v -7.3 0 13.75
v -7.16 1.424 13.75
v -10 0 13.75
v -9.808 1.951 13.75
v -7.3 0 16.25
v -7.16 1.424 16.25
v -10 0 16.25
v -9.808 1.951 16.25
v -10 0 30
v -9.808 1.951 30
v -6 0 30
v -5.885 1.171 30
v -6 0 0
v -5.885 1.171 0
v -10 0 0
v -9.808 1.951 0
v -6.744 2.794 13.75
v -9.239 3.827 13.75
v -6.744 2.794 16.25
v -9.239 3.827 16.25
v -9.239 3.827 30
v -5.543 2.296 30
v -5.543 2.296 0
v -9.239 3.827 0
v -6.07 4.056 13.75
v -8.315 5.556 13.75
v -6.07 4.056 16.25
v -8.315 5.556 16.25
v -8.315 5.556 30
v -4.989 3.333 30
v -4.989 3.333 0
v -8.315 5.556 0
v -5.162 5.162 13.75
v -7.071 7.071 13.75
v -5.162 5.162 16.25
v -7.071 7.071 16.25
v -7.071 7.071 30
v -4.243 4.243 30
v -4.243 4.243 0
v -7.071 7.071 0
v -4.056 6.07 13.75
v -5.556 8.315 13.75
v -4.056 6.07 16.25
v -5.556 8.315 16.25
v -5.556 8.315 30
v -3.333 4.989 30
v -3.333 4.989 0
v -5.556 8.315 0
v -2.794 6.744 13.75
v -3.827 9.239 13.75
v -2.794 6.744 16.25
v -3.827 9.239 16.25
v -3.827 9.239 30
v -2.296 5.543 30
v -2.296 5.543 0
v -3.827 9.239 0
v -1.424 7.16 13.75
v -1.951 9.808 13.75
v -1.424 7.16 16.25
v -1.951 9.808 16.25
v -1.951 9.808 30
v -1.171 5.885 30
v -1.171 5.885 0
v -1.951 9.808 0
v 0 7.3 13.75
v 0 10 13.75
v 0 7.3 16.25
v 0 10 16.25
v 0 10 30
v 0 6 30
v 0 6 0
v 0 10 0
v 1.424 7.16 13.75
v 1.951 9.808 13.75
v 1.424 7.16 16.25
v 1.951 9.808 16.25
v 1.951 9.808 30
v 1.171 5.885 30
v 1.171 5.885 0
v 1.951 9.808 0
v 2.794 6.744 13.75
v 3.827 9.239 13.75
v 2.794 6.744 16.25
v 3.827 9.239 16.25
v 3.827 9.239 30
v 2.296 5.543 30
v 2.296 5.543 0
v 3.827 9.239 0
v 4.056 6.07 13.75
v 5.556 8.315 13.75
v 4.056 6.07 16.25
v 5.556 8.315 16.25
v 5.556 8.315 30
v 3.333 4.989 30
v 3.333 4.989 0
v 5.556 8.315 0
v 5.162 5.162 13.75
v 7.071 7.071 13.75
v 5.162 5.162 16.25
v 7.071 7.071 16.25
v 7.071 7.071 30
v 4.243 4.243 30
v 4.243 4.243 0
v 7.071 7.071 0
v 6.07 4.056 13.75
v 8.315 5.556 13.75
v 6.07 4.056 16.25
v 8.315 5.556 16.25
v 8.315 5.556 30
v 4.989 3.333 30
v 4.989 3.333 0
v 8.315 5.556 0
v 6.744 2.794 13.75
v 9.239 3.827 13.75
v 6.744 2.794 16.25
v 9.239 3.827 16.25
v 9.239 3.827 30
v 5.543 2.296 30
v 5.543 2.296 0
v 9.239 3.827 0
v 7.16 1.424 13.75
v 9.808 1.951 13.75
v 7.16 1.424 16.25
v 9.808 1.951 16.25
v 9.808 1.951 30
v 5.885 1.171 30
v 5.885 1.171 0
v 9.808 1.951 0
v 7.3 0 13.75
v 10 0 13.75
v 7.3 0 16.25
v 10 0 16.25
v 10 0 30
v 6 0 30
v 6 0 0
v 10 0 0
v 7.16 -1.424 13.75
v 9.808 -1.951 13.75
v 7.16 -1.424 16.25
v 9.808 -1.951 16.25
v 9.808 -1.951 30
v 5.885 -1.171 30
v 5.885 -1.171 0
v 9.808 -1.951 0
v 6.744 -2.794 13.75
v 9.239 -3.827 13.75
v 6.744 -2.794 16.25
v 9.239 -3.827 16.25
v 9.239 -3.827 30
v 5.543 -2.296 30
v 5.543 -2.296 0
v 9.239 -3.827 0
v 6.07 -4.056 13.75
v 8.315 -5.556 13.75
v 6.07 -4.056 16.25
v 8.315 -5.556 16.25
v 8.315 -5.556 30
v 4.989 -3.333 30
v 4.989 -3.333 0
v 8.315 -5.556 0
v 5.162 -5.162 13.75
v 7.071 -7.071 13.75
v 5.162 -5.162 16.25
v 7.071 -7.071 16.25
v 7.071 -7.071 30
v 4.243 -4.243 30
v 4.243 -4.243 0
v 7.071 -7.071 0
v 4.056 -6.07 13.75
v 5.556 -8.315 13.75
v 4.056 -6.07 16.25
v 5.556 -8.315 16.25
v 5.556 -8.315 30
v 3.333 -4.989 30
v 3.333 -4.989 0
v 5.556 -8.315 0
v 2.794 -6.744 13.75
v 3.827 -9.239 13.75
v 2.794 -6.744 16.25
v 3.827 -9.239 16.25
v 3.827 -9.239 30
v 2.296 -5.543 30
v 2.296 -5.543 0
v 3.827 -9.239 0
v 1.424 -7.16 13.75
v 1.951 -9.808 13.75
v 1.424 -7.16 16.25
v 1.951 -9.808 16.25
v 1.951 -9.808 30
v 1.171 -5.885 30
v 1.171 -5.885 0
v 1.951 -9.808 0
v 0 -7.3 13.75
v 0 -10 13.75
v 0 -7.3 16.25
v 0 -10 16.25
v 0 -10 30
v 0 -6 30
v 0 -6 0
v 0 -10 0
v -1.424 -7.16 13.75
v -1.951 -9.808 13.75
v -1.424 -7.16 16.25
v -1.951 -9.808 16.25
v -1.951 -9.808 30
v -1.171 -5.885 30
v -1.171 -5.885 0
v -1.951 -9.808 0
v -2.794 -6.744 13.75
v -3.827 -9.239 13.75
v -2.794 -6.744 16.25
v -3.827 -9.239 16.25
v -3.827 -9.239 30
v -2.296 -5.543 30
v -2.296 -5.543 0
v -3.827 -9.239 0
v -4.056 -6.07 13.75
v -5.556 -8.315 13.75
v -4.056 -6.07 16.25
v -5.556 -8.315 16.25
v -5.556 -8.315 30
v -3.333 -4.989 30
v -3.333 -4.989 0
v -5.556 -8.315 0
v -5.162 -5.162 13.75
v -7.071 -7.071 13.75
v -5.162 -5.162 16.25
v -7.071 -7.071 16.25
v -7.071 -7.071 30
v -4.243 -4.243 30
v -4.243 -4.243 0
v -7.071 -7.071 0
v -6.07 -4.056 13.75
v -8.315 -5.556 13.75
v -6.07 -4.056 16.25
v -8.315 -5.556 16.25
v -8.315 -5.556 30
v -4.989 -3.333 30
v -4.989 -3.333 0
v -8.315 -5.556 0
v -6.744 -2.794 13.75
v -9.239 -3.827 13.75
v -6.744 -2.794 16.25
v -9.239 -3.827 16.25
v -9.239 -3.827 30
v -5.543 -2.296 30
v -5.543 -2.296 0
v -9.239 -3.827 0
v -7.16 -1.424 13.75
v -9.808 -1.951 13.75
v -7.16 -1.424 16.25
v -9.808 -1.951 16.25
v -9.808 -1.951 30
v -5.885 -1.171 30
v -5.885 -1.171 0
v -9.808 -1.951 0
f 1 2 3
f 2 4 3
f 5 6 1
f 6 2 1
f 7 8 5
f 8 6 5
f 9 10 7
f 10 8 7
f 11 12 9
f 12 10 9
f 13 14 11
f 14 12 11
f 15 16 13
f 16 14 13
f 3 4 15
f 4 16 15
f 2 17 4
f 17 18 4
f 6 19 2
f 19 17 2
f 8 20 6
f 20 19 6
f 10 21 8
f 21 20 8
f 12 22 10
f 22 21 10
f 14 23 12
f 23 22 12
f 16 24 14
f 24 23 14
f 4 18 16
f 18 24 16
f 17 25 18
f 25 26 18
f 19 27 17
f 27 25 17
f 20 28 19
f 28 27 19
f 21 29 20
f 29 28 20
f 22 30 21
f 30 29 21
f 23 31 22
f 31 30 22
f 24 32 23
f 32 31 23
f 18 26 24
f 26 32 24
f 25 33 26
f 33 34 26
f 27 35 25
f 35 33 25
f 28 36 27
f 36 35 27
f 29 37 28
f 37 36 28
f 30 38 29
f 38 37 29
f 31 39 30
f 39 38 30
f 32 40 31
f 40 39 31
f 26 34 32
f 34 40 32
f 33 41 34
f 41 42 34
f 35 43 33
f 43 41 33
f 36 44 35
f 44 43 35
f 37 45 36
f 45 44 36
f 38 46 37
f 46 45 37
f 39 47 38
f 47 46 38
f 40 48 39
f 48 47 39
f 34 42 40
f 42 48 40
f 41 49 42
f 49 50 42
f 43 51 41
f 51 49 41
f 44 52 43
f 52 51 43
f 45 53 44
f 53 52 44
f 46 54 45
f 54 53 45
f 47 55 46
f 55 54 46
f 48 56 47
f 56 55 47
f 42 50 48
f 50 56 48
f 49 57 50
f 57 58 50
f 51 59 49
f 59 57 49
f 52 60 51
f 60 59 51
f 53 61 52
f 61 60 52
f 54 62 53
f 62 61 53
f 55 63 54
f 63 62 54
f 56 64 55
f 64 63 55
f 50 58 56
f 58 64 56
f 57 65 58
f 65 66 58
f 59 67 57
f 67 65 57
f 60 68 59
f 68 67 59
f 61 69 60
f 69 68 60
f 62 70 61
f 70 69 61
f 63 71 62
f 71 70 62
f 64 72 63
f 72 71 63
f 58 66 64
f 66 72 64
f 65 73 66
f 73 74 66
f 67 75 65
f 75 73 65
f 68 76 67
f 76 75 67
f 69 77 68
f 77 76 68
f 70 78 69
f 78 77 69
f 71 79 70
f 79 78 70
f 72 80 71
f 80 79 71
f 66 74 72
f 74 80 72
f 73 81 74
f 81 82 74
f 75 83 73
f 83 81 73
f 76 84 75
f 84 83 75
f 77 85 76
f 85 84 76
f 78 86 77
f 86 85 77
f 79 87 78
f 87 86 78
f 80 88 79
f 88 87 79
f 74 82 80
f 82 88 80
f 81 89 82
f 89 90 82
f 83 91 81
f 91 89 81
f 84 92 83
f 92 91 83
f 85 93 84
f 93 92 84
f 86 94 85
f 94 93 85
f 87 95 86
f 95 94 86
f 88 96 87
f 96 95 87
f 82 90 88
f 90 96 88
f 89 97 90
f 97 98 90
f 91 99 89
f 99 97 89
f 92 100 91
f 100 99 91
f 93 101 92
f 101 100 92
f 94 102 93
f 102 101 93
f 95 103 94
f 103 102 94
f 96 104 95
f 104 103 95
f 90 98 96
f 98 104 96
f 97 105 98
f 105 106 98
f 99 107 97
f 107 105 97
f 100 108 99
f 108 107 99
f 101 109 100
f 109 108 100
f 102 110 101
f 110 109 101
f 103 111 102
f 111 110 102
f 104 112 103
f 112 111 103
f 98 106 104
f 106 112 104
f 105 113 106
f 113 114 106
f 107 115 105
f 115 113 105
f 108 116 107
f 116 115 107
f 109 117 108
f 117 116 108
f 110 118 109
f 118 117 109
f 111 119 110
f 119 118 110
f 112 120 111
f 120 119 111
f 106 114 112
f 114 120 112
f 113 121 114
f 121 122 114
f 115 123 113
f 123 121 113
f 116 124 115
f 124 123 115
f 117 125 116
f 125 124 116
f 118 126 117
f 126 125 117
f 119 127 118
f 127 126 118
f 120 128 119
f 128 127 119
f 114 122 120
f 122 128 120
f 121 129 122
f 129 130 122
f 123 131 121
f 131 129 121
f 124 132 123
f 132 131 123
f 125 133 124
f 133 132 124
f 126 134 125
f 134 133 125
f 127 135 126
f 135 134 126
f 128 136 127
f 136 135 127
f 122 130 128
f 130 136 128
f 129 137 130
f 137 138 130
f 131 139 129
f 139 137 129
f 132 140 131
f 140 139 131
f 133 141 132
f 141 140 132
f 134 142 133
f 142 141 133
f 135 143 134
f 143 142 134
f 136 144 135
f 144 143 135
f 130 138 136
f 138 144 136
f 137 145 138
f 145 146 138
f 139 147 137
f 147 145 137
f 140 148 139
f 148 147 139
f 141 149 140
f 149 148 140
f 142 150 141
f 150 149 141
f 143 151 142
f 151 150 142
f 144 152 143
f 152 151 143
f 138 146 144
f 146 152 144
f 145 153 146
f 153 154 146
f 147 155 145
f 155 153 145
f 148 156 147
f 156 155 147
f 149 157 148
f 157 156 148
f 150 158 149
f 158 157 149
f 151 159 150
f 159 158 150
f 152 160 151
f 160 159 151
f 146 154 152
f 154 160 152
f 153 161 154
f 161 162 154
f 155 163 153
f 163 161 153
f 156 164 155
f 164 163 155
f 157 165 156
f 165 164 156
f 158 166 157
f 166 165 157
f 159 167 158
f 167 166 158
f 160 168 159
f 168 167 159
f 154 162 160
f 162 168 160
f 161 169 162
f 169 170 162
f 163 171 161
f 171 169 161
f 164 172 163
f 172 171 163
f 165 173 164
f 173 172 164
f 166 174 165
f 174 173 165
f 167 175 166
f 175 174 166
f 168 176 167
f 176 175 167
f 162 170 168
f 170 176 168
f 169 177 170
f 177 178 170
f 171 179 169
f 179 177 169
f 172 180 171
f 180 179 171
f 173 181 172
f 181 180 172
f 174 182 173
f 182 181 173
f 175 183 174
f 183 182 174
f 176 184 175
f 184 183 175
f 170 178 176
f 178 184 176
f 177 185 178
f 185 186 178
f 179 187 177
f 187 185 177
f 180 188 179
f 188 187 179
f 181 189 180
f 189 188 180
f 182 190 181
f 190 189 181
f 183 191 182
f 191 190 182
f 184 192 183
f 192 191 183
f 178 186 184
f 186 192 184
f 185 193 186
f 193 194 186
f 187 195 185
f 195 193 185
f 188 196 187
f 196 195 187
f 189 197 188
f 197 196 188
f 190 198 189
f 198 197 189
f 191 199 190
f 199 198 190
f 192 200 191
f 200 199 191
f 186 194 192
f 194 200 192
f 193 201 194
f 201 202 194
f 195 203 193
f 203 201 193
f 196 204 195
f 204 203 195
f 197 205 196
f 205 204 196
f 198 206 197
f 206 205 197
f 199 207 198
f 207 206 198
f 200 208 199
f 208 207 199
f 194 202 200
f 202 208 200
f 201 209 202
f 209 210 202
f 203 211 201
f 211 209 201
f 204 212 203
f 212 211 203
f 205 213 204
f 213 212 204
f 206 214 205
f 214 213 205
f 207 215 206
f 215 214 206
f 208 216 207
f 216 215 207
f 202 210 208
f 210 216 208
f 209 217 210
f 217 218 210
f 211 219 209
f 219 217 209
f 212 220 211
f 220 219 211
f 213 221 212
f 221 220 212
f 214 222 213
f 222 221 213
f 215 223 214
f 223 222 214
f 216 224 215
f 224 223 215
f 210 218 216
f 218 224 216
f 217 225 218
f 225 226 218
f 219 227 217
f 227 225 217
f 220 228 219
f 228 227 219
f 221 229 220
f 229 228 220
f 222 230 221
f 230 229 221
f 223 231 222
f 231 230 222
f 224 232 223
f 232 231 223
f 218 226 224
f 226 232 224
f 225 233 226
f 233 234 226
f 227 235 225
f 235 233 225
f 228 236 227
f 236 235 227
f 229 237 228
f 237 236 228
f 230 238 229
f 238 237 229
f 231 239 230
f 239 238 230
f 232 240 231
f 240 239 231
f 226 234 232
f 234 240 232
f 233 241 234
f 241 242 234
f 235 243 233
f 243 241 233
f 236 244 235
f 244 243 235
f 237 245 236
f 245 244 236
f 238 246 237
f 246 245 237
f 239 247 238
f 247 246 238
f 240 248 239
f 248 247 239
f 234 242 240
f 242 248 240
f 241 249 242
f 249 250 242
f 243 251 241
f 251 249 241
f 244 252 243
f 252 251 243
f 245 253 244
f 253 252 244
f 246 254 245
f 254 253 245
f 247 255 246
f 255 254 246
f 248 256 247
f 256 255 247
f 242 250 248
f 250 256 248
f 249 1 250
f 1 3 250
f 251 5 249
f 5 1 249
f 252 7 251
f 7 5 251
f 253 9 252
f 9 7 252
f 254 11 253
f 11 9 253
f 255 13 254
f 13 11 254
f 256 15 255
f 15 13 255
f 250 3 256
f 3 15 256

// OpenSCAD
$fn = 32;

// ----------------------------------------------------------------------
// Grooved revolve: stepped, bore R6
// ----------------------------------------------------------------------

// --- parameters (mm) ---
bore_r = 6;               // bore radius
outer_r = 10;             // outer radius of the body
total_h = 30;             // overall height, Z
wall = 4;                 // radial wall thickness
groove_w = 2.5;           // groove width
groove_d = 2.7;           // groove depth
grooves = 1;              // number of outer grooves

bbox_x = 2 * outer_r;  // full diameter
bore_d = 2 * bore_r;  // bore diameter
body_d = 2 * outer_r;  // body diameter
revolve_angle = 360;  // full turn around the Z axis

profile = [[6, 0], [10, 0], [10, 13.75], [7.3, 13.75], [7.3, 16.25], [10, 16.25], [10, 30], [6, 30]];  // primary outline, 8 points, counter clockwise

// --- the one profile operation ---
rotate_extrude(angle = revolve_angle) polygon(points = profile);
